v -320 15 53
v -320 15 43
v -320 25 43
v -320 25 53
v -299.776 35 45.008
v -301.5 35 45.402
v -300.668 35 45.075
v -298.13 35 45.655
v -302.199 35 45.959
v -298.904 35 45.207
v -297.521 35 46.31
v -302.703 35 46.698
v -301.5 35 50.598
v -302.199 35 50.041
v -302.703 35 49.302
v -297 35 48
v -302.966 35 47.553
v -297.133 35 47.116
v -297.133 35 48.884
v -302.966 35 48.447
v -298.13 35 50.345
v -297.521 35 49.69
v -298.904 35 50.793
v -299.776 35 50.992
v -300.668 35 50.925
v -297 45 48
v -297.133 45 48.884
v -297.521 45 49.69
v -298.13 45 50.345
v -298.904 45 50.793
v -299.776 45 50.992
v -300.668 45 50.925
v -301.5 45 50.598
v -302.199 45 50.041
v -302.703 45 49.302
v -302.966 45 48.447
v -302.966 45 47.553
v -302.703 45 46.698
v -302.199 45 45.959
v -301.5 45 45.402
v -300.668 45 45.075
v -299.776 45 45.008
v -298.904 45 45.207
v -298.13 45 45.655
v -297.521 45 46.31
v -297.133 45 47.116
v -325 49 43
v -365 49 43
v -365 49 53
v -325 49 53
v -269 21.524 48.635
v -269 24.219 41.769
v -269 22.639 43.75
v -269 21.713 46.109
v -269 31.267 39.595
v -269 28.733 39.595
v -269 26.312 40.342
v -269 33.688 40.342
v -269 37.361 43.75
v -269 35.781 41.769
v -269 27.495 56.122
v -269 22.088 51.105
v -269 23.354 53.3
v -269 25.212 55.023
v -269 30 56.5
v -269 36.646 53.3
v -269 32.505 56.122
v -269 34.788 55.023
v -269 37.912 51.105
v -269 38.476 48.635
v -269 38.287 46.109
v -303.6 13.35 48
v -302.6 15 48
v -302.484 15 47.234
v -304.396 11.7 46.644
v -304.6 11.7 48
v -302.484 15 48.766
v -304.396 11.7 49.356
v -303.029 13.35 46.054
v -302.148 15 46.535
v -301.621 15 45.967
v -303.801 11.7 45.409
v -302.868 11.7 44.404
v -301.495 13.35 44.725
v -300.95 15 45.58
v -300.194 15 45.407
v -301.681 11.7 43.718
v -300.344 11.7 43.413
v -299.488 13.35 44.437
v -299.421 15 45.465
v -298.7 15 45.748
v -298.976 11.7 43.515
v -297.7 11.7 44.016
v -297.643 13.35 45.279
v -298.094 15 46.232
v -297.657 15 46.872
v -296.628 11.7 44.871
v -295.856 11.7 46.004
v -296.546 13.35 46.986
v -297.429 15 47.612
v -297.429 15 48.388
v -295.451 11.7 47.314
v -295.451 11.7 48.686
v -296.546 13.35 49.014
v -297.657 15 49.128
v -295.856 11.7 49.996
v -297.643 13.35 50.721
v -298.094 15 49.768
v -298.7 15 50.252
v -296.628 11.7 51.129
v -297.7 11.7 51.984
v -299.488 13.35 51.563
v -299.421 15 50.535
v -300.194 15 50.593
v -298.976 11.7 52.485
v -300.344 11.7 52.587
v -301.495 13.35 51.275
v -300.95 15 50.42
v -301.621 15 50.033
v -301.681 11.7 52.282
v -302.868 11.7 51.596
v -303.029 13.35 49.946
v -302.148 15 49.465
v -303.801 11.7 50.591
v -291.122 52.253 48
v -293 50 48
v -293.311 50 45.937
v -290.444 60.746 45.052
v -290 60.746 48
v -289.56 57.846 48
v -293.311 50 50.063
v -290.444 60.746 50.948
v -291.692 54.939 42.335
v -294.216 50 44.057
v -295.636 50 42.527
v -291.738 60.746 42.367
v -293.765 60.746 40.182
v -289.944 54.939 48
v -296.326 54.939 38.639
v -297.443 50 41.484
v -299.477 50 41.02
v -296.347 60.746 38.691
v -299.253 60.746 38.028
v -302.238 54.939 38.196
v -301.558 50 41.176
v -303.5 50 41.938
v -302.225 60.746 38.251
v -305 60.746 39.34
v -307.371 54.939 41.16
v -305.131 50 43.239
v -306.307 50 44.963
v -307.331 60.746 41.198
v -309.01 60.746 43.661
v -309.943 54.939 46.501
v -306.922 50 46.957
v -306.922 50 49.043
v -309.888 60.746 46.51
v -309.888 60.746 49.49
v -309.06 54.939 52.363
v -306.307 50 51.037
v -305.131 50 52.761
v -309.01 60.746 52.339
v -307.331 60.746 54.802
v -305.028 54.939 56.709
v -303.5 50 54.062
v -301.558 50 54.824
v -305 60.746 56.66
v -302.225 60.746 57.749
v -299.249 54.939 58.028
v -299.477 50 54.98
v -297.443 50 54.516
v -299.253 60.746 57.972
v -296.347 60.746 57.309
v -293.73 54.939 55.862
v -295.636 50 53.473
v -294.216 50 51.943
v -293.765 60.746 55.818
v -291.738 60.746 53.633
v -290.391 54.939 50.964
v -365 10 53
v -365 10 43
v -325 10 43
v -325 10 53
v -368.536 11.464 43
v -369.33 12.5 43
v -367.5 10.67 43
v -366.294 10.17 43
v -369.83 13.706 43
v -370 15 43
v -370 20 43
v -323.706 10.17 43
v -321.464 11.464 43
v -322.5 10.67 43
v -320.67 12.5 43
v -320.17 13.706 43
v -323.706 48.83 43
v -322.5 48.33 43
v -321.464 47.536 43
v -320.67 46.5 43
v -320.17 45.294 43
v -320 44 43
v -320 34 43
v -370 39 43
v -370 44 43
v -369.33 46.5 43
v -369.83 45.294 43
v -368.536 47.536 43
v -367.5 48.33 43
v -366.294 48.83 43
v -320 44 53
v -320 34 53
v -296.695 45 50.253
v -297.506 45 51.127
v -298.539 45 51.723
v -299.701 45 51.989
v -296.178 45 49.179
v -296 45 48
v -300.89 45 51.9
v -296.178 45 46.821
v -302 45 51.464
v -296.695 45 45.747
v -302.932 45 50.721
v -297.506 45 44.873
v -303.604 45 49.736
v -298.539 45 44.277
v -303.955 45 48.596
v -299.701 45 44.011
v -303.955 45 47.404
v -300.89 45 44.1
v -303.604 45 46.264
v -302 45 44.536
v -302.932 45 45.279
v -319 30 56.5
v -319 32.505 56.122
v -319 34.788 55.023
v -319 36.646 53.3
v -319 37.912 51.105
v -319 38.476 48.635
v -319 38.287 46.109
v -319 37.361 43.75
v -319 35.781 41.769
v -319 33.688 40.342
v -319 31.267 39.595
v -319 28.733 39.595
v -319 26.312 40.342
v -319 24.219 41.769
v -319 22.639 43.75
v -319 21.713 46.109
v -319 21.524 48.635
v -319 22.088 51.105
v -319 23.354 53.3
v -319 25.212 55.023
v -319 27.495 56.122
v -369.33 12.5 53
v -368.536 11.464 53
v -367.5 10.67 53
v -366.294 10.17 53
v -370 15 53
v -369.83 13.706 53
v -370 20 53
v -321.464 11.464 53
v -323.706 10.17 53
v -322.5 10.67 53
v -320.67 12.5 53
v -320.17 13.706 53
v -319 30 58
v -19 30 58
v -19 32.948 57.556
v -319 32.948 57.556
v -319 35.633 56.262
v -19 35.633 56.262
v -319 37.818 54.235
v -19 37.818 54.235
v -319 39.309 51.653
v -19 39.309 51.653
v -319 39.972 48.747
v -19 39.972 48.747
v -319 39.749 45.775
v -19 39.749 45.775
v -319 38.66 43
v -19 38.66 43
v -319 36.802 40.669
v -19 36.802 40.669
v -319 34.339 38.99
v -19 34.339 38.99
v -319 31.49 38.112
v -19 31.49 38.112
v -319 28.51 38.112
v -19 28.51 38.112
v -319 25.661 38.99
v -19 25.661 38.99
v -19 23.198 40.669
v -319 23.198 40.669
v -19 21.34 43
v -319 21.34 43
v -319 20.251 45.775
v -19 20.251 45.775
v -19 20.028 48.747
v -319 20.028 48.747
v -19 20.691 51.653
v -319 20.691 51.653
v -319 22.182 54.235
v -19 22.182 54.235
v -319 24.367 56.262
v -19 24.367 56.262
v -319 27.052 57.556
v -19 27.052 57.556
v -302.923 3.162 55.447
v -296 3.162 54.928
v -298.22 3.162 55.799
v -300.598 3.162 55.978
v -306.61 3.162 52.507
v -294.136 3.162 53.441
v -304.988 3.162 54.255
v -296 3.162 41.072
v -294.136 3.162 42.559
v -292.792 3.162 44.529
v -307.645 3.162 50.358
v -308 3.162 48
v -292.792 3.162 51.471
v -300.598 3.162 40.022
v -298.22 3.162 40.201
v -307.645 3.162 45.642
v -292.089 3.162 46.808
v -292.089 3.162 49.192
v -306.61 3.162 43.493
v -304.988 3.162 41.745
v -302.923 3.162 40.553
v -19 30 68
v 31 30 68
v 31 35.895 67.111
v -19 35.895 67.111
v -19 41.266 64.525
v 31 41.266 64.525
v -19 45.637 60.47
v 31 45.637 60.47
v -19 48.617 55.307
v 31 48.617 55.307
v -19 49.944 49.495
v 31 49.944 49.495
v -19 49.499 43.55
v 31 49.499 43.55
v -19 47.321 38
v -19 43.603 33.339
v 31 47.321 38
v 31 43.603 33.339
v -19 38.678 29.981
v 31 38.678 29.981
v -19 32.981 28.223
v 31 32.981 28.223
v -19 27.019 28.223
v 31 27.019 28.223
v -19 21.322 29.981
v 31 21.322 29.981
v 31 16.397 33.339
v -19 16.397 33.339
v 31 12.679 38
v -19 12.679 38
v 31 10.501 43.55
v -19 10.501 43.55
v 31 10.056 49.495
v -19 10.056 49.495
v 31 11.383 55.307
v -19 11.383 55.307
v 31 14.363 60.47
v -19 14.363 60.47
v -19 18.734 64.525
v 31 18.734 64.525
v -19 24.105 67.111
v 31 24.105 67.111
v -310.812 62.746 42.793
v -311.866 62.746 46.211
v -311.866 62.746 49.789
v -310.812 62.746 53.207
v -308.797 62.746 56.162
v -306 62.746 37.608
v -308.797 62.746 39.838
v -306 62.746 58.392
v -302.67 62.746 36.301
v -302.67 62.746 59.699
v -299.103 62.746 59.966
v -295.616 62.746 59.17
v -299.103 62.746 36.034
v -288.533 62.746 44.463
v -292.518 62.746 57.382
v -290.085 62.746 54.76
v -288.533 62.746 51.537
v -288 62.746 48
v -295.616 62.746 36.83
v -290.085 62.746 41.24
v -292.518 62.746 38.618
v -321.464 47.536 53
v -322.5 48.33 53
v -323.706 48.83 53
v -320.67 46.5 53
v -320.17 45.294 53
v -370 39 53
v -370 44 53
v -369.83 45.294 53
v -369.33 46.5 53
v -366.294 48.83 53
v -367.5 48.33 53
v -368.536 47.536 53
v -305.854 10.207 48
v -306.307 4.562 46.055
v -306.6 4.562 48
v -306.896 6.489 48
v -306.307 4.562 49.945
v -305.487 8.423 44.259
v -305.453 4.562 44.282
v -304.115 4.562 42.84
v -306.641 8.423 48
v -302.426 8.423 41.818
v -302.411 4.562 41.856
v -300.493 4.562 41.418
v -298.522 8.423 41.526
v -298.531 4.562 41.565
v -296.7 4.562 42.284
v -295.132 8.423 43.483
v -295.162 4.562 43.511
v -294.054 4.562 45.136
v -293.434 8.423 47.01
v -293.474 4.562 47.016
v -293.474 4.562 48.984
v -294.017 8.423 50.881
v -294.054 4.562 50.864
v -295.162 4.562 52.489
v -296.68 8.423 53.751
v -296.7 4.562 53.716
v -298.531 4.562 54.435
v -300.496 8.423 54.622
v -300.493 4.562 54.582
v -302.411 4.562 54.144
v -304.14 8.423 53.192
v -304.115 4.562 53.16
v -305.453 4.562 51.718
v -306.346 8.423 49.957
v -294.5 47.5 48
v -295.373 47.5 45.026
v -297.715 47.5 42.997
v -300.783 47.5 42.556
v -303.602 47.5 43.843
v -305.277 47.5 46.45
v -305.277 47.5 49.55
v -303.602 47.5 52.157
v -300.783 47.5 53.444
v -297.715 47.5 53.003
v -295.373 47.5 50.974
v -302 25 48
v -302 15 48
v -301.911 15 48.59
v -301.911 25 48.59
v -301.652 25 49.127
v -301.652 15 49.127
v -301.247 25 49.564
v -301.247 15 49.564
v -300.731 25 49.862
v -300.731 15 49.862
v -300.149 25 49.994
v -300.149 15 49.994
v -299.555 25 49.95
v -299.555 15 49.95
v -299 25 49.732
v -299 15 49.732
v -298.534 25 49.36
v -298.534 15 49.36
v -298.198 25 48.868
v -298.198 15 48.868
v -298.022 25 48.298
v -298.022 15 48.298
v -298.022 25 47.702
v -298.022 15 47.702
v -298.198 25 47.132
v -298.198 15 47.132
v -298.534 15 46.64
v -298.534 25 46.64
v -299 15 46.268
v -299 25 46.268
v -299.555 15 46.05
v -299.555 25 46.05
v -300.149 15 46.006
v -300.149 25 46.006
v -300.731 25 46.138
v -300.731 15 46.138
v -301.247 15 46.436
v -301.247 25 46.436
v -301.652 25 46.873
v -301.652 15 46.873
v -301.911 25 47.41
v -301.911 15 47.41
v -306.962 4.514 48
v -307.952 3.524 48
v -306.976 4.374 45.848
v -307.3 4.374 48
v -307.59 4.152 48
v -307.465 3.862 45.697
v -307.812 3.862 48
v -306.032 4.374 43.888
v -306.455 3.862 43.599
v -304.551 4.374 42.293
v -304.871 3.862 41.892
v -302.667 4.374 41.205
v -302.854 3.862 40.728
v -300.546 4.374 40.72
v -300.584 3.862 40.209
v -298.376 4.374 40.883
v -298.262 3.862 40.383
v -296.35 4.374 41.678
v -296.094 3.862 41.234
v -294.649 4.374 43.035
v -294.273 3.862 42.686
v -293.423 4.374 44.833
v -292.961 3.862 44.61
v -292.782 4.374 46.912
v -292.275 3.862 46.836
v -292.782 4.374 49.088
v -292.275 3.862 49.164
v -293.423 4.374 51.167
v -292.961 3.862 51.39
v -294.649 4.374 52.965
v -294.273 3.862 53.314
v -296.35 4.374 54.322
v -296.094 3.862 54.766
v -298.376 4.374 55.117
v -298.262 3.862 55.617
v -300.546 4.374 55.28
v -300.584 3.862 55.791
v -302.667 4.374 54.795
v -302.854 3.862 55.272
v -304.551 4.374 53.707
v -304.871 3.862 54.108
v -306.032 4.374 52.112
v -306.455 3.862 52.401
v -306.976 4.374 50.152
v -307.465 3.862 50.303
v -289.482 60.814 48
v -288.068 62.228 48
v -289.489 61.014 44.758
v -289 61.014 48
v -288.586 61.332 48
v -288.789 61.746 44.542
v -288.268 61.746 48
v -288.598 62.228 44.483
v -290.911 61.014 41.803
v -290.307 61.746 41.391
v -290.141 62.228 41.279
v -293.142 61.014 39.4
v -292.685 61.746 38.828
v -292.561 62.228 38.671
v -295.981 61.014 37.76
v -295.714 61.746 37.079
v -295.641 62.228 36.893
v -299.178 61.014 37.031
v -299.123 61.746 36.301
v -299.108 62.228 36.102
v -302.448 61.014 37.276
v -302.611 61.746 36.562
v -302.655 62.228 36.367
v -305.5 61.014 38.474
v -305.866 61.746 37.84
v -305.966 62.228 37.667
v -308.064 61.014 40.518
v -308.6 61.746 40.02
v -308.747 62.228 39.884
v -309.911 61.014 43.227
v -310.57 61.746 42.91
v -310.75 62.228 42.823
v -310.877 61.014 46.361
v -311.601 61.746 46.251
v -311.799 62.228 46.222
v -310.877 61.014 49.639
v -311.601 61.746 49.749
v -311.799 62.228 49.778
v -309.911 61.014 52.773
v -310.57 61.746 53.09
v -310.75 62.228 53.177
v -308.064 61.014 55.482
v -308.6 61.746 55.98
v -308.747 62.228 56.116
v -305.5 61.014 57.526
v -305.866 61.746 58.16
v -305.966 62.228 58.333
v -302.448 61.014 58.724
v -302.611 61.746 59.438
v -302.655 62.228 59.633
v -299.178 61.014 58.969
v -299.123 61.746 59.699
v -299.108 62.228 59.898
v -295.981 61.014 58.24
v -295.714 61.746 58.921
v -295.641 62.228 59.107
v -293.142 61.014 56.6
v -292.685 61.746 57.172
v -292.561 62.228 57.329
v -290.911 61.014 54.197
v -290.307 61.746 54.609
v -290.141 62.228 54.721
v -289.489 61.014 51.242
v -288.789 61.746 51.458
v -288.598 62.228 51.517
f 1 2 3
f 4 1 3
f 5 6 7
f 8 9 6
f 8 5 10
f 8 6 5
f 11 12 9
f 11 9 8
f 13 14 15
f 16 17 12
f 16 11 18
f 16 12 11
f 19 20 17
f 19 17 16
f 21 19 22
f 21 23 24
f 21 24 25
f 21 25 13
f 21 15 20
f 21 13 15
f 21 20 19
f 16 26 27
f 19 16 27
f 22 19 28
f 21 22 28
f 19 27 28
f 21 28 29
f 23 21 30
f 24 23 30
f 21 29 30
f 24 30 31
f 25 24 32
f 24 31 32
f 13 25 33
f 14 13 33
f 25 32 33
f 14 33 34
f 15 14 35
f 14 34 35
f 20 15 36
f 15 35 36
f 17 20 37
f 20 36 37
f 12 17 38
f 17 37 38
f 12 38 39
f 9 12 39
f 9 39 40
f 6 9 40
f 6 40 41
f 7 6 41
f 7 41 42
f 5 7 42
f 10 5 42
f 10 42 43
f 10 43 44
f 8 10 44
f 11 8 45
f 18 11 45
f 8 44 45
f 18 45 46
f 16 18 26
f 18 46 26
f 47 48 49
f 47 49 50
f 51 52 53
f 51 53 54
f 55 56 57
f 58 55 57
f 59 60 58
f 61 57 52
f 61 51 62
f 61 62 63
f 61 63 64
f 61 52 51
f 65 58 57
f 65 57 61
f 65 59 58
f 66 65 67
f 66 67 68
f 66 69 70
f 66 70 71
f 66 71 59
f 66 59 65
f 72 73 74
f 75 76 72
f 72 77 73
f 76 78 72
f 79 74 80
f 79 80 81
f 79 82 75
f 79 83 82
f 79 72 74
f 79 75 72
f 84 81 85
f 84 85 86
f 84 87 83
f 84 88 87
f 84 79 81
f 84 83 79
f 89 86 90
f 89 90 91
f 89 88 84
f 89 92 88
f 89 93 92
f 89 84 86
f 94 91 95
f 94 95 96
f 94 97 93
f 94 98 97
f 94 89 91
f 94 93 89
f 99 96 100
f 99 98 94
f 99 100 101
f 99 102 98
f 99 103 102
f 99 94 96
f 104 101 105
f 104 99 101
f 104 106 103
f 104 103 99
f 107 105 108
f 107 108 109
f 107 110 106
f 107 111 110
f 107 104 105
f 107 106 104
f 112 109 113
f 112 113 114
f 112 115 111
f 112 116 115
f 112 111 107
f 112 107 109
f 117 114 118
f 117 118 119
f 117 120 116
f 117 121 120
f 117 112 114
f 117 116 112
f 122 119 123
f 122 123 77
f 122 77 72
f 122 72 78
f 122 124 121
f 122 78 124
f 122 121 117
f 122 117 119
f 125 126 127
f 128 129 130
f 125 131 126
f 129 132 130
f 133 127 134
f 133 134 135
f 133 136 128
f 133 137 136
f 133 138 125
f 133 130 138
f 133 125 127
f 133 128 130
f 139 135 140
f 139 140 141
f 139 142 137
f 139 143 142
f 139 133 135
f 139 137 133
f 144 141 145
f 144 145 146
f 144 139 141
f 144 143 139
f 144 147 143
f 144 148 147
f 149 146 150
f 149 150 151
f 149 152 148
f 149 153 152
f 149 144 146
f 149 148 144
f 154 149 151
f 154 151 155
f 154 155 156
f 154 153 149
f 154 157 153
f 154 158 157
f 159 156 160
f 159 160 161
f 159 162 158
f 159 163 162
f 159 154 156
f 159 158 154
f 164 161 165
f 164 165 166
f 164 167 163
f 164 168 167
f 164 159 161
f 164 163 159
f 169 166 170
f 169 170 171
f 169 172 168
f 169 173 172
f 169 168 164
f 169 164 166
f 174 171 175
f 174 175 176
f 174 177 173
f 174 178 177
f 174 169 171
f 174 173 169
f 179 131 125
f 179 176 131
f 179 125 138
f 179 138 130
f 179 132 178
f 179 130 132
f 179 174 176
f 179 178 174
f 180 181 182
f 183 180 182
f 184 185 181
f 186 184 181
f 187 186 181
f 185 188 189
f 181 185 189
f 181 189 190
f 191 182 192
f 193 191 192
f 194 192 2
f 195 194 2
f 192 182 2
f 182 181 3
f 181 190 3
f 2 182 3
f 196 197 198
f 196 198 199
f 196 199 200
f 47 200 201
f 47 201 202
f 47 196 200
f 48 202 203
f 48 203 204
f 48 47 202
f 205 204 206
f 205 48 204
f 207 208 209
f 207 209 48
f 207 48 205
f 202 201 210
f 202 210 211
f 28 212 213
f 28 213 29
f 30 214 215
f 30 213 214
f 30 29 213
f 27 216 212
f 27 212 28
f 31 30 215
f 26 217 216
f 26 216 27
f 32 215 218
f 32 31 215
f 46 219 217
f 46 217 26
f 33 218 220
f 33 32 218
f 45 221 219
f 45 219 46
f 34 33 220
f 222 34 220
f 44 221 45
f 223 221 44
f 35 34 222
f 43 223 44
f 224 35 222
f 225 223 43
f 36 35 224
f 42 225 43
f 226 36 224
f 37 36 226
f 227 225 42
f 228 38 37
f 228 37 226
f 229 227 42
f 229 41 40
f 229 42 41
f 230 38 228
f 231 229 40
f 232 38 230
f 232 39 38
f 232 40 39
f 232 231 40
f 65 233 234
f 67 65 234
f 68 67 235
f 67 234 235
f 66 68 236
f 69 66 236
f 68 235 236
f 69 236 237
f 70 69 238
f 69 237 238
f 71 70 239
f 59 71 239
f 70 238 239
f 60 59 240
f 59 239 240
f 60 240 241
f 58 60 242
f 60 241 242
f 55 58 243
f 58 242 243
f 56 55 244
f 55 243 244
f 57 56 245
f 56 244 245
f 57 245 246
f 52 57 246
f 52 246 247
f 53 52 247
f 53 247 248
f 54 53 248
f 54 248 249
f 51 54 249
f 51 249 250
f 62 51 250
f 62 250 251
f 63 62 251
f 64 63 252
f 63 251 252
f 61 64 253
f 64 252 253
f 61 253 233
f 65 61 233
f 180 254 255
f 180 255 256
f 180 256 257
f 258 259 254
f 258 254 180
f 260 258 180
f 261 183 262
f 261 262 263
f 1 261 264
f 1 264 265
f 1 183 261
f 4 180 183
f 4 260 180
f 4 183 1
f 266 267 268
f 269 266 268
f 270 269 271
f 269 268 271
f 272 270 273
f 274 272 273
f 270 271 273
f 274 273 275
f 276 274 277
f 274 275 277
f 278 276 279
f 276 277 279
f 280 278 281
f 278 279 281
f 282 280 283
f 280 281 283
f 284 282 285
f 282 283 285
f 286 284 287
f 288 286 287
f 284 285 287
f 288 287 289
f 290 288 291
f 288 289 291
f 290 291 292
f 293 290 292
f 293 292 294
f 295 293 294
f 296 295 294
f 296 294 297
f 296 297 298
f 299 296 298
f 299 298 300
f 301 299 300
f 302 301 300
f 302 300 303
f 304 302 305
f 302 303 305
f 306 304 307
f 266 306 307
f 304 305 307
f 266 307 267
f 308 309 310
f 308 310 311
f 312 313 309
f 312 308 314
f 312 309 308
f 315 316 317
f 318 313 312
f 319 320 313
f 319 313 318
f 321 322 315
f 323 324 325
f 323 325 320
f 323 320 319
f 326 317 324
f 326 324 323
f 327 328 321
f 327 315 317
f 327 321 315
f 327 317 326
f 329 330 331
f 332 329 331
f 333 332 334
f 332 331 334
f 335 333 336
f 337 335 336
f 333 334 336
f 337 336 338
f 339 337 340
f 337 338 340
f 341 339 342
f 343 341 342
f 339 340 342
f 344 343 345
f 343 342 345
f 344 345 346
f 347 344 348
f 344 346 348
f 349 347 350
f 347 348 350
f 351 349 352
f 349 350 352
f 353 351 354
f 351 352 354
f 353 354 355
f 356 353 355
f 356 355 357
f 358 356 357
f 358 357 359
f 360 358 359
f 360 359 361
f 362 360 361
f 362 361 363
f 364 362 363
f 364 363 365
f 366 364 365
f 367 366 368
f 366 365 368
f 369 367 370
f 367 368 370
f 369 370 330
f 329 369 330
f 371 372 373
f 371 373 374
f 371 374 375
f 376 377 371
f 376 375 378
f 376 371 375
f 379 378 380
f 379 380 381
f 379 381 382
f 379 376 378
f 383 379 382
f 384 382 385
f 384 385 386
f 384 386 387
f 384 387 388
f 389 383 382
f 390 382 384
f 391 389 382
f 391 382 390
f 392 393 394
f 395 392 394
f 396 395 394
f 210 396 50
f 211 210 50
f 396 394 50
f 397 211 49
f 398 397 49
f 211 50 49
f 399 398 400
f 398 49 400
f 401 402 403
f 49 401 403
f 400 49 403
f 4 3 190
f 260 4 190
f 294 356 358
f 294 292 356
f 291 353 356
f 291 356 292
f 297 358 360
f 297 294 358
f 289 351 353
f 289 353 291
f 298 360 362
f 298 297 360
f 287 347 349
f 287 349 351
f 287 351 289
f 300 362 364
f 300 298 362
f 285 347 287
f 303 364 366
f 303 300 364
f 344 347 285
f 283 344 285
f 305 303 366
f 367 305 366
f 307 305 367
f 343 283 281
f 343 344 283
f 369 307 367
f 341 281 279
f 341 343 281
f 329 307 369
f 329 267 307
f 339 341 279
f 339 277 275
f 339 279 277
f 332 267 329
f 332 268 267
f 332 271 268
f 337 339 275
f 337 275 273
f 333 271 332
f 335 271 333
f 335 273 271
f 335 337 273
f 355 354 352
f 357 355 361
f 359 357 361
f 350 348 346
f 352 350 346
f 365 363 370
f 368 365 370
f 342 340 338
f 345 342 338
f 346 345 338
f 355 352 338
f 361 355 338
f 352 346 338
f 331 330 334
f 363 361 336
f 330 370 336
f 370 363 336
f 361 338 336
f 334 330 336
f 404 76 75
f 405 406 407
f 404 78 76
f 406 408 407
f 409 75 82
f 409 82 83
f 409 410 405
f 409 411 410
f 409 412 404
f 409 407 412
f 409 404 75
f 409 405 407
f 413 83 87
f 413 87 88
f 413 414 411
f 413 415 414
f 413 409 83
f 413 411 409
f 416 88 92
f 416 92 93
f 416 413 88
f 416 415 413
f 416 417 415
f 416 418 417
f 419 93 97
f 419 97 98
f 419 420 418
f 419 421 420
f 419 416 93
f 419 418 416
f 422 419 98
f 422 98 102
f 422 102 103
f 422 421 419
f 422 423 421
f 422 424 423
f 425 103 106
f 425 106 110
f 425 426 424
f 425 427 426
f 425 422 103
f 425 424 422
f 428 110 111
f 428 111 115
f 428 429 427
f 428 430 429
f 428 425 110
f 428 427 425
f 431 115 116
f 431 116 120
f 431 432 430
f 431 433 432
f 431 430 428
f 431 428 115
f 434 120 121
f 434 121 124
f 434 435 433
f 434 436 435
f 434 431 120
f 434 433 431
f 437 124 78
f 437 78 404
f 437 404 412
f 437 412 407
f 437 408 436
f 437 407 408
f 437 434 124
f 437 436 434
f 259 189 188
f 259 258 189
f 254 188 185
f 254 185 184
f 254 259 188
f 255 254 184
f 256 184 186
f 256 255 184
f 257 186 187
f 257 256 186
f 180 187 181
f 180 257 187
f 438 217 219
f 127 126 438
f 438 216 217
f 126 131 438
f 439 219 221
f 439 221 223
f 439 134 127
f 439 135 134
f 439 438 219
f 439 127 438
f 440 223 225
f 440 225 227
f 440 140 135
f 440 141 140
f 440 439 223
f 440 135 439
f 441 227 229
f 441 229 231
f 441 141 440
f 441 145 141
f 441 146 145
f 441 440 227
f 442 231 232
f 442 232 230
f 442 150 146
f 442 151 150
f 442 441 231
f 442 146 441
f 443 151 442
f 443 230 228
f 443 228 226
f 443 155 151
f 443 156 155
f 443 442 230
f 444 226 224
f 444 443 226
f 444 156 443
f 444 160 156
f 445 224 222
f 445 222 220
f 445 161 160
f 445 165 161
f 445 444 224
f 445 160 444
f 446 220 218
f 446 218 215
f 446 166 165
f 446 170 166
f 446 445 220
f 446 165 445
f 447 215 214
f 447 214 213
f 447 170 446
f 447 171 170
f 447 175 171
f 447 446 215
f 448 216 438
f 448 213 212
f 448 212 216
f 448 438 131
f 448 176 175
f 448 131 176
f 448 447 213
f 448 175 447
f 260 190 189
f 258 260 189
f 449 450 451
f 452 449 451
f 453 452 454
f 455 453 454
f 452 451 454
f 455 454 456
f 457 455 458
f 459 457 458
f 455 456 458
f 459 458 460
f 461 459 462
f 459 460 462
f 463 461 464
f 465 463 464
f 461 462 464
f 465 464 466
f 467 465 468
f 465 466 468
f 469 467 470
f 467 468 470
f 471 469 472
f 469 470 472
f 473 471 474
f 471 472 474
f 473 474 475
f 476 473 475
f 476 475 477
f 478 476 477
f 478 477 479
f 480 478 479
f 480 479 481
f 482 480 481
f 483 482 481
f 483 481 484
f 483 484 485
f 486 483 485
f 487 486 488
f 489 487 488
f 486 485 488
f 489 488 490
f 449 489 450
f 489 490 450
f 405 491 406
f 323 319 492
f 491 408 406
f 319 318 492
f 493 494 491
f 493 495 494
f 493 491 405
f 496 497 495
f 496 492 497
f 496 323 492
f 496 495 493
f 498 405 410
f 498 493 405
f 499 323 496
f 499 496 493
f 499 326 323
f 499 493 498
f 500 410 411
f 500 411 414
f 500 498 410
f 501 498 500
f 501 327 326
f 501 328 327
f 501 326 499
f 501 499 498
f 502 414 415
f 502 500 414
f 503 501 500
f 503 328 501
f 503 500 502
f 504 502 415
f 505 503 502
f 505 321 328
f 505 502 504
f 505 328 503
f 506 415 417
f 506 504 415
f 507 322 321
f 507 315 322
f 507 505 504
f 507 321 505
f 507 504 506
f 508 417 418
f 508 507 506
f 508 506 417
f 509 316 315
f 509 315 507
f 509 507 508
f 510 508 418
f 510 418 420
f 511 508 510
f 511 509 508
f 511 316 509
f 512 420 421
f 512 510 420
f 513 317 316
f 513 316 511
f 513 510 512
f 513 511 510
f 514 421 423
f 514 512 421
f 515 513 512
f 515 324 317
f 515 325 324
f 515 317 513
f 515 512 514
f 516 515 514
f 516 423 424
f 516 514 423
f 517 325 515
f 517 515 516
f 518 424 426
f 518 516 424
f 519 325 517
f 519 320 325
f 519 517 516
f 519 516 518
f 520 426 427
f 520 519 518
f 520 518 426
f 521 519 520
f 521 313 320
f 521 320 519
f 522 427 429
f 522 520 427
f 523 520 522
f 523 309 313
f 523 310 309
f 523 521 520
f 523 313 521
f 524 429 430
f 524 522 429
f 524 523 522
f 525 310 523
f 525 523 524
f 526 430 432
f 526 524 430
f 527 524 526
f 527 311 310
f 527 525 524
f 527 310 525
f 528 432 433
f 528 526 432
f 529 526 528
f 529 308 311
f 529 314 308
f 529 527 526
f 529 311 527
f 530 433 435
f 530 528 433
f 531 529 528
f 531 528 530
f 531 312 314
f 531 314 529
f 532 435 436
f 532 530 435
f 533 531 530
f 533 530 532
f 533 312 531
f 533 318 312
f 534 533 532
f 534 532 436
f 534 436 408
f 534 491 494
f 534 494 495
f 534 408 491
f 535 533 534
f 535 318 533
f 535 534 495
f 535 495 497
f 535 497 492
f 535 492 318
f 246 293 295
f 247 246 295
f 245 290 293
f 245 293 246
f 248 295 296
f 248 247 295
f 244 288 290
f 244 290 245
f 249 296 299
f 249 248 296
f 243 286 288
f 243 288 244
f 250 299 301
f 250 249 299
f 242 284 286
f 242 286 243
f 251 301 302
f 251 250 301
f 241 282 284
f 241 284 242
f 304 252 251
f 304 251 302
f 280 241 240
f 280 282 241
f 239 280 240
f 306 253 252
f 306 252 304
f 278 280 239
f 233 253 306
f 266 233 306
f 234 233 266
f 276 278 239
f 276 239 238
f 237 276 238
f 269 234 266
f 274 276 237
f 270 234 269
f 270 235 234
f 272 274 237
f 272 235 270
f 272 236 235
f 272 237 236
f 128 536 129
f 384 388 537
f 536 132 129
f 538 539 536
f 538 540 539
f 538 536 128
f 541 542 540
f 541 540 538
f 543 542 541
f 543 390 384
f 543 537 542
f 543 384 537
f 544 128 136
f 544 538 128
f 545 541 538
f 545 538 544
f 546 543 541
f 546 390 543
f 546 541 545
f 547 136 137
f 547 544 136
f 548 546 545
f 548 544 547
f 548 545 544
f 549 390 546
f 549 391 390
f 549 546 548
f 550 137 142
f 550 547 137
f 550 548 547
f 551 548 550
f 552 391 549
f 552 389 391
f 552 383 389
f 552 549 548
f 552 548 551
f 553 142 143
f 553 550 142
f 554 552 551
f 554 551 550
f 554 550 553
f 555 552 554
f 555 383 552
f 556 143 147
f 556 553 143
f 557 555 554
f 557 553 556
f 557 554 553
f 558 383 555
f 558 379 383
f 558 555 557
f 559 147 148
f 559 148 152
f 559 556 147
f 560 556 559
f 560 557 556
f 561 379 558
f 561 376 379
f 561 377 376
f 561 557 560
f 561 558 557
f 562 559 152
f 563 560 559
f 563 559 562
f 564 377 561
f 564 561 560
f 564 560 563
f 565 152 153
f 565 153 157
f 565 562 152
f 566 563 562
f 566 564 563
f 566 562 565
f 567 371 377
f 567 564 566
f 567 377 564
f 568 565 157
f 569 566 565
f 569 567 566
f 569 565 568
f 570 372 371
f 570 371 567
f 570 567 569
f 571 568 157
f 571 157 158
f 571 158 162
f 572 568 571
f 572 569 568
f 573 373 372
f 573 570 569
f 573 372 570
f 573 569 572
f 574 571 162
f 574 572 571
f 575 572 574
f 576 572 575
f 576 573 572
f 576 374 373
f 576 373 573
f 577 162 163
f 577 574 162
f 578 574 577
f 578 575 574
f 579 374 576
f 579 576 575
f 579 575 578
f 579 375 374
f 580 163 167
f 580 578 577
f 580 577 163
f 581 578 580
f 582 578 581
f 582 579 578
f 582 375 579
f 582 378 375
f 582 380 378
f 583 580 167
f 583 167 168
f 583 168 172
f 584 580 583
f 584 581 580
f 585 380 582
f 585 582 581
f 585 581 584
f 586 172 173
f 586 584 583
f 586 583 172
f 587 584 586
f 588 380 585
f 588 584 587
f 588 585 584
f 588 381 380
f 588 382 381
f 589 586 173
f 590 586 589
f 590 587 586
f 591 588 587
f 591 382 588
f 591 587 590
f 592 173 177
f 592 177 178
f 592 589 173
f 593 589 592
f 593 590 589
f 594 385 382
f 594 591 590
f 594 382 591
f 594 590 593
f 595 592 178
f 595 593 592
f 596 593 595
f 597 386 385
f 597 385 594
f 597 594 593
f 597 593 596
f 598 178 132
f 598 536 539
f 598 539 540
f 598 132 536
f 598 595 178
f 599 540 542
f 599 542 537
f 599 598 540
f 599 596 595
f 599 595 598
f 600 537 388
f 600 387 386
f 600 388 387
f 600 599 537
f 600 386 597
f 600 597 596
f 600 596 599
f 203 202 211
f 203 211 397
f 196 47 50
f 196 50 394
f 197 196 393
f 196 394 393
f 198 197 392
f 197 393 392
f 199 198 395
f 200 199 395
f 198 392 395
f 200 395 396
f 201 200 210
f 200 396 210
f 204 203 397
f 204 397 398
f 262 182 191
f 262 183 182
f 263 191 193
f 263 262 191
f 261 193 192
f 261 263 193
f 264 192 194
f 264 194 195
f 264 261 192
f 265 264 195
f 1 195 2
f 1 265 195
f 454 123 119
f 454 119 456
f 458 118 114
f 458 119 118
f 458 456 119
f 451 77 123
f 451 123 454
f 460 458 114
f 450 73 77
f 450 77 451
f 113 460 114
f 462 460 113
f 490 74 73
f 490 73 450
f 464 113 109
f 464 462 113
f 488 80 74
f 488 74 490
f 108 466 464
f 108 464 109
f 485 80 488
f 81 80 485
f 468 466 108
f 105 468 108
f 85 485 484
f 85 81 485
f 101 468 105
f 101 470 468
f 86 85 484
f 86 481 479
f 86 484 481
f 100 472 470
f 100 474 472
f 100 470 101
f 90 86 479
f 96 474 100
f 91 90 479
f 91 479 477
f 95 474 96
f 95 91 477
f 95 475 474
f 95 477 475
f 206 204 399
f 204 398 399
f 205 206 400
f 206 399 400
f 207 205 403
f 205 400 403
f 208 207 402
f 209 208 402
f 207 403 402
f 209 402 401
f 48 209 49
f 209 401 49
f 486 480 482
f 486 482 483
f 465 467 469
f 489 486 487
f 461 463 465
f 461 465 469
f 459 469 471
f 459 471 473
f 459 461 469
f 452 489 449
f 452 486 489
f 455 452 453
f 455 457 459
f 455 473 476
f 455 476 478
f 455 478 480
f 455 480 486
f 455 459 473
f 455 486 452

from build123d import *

# Parameters (mm, degrees)
SKETCH004_R  = 3
PAD002_DEPTH = 10
SKETCH006_R  = 2
PAD003_DEPTH = 10
PAD004_DEPTH = 10
FILLET_R     = 5
FILLET001_R  = 5
PAD005_DEPTH = 10
FILLET002_R  = 5
FILLET003_R  = 5
SKETCH002_R  = 20
PAD_DEPTH    = 50
SKETCH_R     = 10
PAD001_DEPTH = 300
SKETCH009_R  = 8.5
POCKET_DEPTH = 50


with BuildPart() as ventosa_grande:
    # Sketch003 → Revolution (revolve)
    with BuildSketch(Plane(origin=(-300, 45, 48), x_dir=(1, 0, 0), z_dir=(0, 0, 1))):
        with BuildLine():
            Line((0, 0), (4, 0))
            Line((4, 0), (7, 5))
            ThreePointArc((7, 5), (10.055792, 9.938646), (10, 15.745967))
            ThreePointArc((10, 15.745967), (11.414214, 16.331753), (12, 17.745967))
            Line((12, 17.745967), (0, 17.745967))
            Line((0, 17.745967), (0, 0))
        make_face()
    revolve(axis=Axis((-300, 45, 48), (0, 1, 0)))

    # Sketch004 → Pad002 (new body)
    with BuildSketch(Plane(origin=(-300, 45, 48), x_dir=(1, 0, 0), z_dir=(0, -1, 0))):
        Circle(SKETCH004_R)
    extrude(amount=PAD002_DEPTH)


with BuildPart() as ventosa_piccola:
    # Sketch005 → Revolution001 (revolve)
    with BuildSketch(Plane(origin=(-300, 15, 48), x_dir=(-1, 0, 0), z_dir=(0, 0, 1))):
        with BuildLine():
            Line((0, 0), (2.6, 0))
            Line((2.6, 0), (4.6, 3.3))
            ThreePointArc((4.6, 3.3), (6.64064, 6.577473), (6.6, 10.438093))
            ThreePointArc((6.6, 10.438093), (7.589949, 10.848144), (8, 11.838093))
            Line((8, 11.838093), (0, 11.838093))
            Line((0, 11.838093), (0, 0))
        make_face()
    revolve(axis=Axis((-300, 15, 48), (0, -1, 0)))

    # Sketch006 → Pad003 (new body)
    with BuildSketch(Plane(origin=(-300, 15, 48), x_dir=(-1, 0, 0), z_dir=(0, 1, 0))):
        Circle(SKETCH006_R)
    extrude(amount=PAD003_DEPTH)


with BuildPart() as fillet001:
    # Sketch007 → Pad004 (new body)
    with BuildSketch(Plane(origin=(-320, 10, 43), x_dir=(1, 0, 0), z_dir=(0, 0, 1))):
        Polygon((-50, 10), (-50, 0), (0, 0), (0, 15), align=None)
    extrude(amount=PAD004_DEPTH)

    # Fillet
    fillet_edges = [fillet001.edges().sort_by_distance(p)[0] for p in [
        (-370, 10, 48),
    ]]
    fillet(fillet_edges, radius=FILLET_R)

    # Fillet001
    fillet001_edges = [fillet001.edges().sort_by_distance(p)[0] for p in [
        (-320, 10, 48),
    ]]
    fillet(fillet001_edges, radius=FILLET001_R)


with BuildPart() as fillet003:
    # Sketch008 → Pad005 (new body)
    with BuildSketch(Plane(origin=(-320, 49, 43), x_dir=(1, 0, 0), z_dir=(0, 0, 1))):
        Polygon((-50, -10), (-50, 0), (0, 0), (0, -15), align=None)
    extrude(amount=PAD005_DEPTH)

    # Fillet002
    fillet002_edges = [fillet003.edges().sort_by_distance(p)[0] for p in [
        (-370, 49, 48),
    ]]
    fillet(fillet002_edges, radius=FILLET002_R)

    # Fillet003
    fillet003_edges = [fillet003.edges().sort_by_distance(p)[0] for p in [
        (-320, 49, 48),
    ]]
    fillet(fillet003_edges, radius=FILLET003_R)


with BuildPart() as pocket:
    # Sketch002 → Pad (new body)
    with BuildSketch(Plane(origin=(31, 30, 48), x_dir=(0, 0, 1), z_dir=(-1, 0, 0))):
        Circle(SKETCH002_R)
    extrude(amount=PAD_DEPTH)

    # Sketch → Pad001 (new body)
    with BuildSketch(Plane(origin=(-19, 30, 48), x_dir=(0, 0, 1), z_dir=(-1, 0, 0))):
        Circle(SKETCH_R)
    extrude(amount=PAD001_DEPTH)

    # Sketch009 → Pocket (cut)
    with BuildSketch(Plane(origin=(-319, 30, 48), x_dir=(0, 0, 1), z_dir=(-1, 0, 0))):
        Circle(SKETCH009_R)
    extrude(amount=-POCKET_DEPTH, mode=Mode.SUBTRACT)


solid = Compound([ventosa_grande.part, ventosa_piccola.part, fillet001.part, fillet003.part, pocket.part])
